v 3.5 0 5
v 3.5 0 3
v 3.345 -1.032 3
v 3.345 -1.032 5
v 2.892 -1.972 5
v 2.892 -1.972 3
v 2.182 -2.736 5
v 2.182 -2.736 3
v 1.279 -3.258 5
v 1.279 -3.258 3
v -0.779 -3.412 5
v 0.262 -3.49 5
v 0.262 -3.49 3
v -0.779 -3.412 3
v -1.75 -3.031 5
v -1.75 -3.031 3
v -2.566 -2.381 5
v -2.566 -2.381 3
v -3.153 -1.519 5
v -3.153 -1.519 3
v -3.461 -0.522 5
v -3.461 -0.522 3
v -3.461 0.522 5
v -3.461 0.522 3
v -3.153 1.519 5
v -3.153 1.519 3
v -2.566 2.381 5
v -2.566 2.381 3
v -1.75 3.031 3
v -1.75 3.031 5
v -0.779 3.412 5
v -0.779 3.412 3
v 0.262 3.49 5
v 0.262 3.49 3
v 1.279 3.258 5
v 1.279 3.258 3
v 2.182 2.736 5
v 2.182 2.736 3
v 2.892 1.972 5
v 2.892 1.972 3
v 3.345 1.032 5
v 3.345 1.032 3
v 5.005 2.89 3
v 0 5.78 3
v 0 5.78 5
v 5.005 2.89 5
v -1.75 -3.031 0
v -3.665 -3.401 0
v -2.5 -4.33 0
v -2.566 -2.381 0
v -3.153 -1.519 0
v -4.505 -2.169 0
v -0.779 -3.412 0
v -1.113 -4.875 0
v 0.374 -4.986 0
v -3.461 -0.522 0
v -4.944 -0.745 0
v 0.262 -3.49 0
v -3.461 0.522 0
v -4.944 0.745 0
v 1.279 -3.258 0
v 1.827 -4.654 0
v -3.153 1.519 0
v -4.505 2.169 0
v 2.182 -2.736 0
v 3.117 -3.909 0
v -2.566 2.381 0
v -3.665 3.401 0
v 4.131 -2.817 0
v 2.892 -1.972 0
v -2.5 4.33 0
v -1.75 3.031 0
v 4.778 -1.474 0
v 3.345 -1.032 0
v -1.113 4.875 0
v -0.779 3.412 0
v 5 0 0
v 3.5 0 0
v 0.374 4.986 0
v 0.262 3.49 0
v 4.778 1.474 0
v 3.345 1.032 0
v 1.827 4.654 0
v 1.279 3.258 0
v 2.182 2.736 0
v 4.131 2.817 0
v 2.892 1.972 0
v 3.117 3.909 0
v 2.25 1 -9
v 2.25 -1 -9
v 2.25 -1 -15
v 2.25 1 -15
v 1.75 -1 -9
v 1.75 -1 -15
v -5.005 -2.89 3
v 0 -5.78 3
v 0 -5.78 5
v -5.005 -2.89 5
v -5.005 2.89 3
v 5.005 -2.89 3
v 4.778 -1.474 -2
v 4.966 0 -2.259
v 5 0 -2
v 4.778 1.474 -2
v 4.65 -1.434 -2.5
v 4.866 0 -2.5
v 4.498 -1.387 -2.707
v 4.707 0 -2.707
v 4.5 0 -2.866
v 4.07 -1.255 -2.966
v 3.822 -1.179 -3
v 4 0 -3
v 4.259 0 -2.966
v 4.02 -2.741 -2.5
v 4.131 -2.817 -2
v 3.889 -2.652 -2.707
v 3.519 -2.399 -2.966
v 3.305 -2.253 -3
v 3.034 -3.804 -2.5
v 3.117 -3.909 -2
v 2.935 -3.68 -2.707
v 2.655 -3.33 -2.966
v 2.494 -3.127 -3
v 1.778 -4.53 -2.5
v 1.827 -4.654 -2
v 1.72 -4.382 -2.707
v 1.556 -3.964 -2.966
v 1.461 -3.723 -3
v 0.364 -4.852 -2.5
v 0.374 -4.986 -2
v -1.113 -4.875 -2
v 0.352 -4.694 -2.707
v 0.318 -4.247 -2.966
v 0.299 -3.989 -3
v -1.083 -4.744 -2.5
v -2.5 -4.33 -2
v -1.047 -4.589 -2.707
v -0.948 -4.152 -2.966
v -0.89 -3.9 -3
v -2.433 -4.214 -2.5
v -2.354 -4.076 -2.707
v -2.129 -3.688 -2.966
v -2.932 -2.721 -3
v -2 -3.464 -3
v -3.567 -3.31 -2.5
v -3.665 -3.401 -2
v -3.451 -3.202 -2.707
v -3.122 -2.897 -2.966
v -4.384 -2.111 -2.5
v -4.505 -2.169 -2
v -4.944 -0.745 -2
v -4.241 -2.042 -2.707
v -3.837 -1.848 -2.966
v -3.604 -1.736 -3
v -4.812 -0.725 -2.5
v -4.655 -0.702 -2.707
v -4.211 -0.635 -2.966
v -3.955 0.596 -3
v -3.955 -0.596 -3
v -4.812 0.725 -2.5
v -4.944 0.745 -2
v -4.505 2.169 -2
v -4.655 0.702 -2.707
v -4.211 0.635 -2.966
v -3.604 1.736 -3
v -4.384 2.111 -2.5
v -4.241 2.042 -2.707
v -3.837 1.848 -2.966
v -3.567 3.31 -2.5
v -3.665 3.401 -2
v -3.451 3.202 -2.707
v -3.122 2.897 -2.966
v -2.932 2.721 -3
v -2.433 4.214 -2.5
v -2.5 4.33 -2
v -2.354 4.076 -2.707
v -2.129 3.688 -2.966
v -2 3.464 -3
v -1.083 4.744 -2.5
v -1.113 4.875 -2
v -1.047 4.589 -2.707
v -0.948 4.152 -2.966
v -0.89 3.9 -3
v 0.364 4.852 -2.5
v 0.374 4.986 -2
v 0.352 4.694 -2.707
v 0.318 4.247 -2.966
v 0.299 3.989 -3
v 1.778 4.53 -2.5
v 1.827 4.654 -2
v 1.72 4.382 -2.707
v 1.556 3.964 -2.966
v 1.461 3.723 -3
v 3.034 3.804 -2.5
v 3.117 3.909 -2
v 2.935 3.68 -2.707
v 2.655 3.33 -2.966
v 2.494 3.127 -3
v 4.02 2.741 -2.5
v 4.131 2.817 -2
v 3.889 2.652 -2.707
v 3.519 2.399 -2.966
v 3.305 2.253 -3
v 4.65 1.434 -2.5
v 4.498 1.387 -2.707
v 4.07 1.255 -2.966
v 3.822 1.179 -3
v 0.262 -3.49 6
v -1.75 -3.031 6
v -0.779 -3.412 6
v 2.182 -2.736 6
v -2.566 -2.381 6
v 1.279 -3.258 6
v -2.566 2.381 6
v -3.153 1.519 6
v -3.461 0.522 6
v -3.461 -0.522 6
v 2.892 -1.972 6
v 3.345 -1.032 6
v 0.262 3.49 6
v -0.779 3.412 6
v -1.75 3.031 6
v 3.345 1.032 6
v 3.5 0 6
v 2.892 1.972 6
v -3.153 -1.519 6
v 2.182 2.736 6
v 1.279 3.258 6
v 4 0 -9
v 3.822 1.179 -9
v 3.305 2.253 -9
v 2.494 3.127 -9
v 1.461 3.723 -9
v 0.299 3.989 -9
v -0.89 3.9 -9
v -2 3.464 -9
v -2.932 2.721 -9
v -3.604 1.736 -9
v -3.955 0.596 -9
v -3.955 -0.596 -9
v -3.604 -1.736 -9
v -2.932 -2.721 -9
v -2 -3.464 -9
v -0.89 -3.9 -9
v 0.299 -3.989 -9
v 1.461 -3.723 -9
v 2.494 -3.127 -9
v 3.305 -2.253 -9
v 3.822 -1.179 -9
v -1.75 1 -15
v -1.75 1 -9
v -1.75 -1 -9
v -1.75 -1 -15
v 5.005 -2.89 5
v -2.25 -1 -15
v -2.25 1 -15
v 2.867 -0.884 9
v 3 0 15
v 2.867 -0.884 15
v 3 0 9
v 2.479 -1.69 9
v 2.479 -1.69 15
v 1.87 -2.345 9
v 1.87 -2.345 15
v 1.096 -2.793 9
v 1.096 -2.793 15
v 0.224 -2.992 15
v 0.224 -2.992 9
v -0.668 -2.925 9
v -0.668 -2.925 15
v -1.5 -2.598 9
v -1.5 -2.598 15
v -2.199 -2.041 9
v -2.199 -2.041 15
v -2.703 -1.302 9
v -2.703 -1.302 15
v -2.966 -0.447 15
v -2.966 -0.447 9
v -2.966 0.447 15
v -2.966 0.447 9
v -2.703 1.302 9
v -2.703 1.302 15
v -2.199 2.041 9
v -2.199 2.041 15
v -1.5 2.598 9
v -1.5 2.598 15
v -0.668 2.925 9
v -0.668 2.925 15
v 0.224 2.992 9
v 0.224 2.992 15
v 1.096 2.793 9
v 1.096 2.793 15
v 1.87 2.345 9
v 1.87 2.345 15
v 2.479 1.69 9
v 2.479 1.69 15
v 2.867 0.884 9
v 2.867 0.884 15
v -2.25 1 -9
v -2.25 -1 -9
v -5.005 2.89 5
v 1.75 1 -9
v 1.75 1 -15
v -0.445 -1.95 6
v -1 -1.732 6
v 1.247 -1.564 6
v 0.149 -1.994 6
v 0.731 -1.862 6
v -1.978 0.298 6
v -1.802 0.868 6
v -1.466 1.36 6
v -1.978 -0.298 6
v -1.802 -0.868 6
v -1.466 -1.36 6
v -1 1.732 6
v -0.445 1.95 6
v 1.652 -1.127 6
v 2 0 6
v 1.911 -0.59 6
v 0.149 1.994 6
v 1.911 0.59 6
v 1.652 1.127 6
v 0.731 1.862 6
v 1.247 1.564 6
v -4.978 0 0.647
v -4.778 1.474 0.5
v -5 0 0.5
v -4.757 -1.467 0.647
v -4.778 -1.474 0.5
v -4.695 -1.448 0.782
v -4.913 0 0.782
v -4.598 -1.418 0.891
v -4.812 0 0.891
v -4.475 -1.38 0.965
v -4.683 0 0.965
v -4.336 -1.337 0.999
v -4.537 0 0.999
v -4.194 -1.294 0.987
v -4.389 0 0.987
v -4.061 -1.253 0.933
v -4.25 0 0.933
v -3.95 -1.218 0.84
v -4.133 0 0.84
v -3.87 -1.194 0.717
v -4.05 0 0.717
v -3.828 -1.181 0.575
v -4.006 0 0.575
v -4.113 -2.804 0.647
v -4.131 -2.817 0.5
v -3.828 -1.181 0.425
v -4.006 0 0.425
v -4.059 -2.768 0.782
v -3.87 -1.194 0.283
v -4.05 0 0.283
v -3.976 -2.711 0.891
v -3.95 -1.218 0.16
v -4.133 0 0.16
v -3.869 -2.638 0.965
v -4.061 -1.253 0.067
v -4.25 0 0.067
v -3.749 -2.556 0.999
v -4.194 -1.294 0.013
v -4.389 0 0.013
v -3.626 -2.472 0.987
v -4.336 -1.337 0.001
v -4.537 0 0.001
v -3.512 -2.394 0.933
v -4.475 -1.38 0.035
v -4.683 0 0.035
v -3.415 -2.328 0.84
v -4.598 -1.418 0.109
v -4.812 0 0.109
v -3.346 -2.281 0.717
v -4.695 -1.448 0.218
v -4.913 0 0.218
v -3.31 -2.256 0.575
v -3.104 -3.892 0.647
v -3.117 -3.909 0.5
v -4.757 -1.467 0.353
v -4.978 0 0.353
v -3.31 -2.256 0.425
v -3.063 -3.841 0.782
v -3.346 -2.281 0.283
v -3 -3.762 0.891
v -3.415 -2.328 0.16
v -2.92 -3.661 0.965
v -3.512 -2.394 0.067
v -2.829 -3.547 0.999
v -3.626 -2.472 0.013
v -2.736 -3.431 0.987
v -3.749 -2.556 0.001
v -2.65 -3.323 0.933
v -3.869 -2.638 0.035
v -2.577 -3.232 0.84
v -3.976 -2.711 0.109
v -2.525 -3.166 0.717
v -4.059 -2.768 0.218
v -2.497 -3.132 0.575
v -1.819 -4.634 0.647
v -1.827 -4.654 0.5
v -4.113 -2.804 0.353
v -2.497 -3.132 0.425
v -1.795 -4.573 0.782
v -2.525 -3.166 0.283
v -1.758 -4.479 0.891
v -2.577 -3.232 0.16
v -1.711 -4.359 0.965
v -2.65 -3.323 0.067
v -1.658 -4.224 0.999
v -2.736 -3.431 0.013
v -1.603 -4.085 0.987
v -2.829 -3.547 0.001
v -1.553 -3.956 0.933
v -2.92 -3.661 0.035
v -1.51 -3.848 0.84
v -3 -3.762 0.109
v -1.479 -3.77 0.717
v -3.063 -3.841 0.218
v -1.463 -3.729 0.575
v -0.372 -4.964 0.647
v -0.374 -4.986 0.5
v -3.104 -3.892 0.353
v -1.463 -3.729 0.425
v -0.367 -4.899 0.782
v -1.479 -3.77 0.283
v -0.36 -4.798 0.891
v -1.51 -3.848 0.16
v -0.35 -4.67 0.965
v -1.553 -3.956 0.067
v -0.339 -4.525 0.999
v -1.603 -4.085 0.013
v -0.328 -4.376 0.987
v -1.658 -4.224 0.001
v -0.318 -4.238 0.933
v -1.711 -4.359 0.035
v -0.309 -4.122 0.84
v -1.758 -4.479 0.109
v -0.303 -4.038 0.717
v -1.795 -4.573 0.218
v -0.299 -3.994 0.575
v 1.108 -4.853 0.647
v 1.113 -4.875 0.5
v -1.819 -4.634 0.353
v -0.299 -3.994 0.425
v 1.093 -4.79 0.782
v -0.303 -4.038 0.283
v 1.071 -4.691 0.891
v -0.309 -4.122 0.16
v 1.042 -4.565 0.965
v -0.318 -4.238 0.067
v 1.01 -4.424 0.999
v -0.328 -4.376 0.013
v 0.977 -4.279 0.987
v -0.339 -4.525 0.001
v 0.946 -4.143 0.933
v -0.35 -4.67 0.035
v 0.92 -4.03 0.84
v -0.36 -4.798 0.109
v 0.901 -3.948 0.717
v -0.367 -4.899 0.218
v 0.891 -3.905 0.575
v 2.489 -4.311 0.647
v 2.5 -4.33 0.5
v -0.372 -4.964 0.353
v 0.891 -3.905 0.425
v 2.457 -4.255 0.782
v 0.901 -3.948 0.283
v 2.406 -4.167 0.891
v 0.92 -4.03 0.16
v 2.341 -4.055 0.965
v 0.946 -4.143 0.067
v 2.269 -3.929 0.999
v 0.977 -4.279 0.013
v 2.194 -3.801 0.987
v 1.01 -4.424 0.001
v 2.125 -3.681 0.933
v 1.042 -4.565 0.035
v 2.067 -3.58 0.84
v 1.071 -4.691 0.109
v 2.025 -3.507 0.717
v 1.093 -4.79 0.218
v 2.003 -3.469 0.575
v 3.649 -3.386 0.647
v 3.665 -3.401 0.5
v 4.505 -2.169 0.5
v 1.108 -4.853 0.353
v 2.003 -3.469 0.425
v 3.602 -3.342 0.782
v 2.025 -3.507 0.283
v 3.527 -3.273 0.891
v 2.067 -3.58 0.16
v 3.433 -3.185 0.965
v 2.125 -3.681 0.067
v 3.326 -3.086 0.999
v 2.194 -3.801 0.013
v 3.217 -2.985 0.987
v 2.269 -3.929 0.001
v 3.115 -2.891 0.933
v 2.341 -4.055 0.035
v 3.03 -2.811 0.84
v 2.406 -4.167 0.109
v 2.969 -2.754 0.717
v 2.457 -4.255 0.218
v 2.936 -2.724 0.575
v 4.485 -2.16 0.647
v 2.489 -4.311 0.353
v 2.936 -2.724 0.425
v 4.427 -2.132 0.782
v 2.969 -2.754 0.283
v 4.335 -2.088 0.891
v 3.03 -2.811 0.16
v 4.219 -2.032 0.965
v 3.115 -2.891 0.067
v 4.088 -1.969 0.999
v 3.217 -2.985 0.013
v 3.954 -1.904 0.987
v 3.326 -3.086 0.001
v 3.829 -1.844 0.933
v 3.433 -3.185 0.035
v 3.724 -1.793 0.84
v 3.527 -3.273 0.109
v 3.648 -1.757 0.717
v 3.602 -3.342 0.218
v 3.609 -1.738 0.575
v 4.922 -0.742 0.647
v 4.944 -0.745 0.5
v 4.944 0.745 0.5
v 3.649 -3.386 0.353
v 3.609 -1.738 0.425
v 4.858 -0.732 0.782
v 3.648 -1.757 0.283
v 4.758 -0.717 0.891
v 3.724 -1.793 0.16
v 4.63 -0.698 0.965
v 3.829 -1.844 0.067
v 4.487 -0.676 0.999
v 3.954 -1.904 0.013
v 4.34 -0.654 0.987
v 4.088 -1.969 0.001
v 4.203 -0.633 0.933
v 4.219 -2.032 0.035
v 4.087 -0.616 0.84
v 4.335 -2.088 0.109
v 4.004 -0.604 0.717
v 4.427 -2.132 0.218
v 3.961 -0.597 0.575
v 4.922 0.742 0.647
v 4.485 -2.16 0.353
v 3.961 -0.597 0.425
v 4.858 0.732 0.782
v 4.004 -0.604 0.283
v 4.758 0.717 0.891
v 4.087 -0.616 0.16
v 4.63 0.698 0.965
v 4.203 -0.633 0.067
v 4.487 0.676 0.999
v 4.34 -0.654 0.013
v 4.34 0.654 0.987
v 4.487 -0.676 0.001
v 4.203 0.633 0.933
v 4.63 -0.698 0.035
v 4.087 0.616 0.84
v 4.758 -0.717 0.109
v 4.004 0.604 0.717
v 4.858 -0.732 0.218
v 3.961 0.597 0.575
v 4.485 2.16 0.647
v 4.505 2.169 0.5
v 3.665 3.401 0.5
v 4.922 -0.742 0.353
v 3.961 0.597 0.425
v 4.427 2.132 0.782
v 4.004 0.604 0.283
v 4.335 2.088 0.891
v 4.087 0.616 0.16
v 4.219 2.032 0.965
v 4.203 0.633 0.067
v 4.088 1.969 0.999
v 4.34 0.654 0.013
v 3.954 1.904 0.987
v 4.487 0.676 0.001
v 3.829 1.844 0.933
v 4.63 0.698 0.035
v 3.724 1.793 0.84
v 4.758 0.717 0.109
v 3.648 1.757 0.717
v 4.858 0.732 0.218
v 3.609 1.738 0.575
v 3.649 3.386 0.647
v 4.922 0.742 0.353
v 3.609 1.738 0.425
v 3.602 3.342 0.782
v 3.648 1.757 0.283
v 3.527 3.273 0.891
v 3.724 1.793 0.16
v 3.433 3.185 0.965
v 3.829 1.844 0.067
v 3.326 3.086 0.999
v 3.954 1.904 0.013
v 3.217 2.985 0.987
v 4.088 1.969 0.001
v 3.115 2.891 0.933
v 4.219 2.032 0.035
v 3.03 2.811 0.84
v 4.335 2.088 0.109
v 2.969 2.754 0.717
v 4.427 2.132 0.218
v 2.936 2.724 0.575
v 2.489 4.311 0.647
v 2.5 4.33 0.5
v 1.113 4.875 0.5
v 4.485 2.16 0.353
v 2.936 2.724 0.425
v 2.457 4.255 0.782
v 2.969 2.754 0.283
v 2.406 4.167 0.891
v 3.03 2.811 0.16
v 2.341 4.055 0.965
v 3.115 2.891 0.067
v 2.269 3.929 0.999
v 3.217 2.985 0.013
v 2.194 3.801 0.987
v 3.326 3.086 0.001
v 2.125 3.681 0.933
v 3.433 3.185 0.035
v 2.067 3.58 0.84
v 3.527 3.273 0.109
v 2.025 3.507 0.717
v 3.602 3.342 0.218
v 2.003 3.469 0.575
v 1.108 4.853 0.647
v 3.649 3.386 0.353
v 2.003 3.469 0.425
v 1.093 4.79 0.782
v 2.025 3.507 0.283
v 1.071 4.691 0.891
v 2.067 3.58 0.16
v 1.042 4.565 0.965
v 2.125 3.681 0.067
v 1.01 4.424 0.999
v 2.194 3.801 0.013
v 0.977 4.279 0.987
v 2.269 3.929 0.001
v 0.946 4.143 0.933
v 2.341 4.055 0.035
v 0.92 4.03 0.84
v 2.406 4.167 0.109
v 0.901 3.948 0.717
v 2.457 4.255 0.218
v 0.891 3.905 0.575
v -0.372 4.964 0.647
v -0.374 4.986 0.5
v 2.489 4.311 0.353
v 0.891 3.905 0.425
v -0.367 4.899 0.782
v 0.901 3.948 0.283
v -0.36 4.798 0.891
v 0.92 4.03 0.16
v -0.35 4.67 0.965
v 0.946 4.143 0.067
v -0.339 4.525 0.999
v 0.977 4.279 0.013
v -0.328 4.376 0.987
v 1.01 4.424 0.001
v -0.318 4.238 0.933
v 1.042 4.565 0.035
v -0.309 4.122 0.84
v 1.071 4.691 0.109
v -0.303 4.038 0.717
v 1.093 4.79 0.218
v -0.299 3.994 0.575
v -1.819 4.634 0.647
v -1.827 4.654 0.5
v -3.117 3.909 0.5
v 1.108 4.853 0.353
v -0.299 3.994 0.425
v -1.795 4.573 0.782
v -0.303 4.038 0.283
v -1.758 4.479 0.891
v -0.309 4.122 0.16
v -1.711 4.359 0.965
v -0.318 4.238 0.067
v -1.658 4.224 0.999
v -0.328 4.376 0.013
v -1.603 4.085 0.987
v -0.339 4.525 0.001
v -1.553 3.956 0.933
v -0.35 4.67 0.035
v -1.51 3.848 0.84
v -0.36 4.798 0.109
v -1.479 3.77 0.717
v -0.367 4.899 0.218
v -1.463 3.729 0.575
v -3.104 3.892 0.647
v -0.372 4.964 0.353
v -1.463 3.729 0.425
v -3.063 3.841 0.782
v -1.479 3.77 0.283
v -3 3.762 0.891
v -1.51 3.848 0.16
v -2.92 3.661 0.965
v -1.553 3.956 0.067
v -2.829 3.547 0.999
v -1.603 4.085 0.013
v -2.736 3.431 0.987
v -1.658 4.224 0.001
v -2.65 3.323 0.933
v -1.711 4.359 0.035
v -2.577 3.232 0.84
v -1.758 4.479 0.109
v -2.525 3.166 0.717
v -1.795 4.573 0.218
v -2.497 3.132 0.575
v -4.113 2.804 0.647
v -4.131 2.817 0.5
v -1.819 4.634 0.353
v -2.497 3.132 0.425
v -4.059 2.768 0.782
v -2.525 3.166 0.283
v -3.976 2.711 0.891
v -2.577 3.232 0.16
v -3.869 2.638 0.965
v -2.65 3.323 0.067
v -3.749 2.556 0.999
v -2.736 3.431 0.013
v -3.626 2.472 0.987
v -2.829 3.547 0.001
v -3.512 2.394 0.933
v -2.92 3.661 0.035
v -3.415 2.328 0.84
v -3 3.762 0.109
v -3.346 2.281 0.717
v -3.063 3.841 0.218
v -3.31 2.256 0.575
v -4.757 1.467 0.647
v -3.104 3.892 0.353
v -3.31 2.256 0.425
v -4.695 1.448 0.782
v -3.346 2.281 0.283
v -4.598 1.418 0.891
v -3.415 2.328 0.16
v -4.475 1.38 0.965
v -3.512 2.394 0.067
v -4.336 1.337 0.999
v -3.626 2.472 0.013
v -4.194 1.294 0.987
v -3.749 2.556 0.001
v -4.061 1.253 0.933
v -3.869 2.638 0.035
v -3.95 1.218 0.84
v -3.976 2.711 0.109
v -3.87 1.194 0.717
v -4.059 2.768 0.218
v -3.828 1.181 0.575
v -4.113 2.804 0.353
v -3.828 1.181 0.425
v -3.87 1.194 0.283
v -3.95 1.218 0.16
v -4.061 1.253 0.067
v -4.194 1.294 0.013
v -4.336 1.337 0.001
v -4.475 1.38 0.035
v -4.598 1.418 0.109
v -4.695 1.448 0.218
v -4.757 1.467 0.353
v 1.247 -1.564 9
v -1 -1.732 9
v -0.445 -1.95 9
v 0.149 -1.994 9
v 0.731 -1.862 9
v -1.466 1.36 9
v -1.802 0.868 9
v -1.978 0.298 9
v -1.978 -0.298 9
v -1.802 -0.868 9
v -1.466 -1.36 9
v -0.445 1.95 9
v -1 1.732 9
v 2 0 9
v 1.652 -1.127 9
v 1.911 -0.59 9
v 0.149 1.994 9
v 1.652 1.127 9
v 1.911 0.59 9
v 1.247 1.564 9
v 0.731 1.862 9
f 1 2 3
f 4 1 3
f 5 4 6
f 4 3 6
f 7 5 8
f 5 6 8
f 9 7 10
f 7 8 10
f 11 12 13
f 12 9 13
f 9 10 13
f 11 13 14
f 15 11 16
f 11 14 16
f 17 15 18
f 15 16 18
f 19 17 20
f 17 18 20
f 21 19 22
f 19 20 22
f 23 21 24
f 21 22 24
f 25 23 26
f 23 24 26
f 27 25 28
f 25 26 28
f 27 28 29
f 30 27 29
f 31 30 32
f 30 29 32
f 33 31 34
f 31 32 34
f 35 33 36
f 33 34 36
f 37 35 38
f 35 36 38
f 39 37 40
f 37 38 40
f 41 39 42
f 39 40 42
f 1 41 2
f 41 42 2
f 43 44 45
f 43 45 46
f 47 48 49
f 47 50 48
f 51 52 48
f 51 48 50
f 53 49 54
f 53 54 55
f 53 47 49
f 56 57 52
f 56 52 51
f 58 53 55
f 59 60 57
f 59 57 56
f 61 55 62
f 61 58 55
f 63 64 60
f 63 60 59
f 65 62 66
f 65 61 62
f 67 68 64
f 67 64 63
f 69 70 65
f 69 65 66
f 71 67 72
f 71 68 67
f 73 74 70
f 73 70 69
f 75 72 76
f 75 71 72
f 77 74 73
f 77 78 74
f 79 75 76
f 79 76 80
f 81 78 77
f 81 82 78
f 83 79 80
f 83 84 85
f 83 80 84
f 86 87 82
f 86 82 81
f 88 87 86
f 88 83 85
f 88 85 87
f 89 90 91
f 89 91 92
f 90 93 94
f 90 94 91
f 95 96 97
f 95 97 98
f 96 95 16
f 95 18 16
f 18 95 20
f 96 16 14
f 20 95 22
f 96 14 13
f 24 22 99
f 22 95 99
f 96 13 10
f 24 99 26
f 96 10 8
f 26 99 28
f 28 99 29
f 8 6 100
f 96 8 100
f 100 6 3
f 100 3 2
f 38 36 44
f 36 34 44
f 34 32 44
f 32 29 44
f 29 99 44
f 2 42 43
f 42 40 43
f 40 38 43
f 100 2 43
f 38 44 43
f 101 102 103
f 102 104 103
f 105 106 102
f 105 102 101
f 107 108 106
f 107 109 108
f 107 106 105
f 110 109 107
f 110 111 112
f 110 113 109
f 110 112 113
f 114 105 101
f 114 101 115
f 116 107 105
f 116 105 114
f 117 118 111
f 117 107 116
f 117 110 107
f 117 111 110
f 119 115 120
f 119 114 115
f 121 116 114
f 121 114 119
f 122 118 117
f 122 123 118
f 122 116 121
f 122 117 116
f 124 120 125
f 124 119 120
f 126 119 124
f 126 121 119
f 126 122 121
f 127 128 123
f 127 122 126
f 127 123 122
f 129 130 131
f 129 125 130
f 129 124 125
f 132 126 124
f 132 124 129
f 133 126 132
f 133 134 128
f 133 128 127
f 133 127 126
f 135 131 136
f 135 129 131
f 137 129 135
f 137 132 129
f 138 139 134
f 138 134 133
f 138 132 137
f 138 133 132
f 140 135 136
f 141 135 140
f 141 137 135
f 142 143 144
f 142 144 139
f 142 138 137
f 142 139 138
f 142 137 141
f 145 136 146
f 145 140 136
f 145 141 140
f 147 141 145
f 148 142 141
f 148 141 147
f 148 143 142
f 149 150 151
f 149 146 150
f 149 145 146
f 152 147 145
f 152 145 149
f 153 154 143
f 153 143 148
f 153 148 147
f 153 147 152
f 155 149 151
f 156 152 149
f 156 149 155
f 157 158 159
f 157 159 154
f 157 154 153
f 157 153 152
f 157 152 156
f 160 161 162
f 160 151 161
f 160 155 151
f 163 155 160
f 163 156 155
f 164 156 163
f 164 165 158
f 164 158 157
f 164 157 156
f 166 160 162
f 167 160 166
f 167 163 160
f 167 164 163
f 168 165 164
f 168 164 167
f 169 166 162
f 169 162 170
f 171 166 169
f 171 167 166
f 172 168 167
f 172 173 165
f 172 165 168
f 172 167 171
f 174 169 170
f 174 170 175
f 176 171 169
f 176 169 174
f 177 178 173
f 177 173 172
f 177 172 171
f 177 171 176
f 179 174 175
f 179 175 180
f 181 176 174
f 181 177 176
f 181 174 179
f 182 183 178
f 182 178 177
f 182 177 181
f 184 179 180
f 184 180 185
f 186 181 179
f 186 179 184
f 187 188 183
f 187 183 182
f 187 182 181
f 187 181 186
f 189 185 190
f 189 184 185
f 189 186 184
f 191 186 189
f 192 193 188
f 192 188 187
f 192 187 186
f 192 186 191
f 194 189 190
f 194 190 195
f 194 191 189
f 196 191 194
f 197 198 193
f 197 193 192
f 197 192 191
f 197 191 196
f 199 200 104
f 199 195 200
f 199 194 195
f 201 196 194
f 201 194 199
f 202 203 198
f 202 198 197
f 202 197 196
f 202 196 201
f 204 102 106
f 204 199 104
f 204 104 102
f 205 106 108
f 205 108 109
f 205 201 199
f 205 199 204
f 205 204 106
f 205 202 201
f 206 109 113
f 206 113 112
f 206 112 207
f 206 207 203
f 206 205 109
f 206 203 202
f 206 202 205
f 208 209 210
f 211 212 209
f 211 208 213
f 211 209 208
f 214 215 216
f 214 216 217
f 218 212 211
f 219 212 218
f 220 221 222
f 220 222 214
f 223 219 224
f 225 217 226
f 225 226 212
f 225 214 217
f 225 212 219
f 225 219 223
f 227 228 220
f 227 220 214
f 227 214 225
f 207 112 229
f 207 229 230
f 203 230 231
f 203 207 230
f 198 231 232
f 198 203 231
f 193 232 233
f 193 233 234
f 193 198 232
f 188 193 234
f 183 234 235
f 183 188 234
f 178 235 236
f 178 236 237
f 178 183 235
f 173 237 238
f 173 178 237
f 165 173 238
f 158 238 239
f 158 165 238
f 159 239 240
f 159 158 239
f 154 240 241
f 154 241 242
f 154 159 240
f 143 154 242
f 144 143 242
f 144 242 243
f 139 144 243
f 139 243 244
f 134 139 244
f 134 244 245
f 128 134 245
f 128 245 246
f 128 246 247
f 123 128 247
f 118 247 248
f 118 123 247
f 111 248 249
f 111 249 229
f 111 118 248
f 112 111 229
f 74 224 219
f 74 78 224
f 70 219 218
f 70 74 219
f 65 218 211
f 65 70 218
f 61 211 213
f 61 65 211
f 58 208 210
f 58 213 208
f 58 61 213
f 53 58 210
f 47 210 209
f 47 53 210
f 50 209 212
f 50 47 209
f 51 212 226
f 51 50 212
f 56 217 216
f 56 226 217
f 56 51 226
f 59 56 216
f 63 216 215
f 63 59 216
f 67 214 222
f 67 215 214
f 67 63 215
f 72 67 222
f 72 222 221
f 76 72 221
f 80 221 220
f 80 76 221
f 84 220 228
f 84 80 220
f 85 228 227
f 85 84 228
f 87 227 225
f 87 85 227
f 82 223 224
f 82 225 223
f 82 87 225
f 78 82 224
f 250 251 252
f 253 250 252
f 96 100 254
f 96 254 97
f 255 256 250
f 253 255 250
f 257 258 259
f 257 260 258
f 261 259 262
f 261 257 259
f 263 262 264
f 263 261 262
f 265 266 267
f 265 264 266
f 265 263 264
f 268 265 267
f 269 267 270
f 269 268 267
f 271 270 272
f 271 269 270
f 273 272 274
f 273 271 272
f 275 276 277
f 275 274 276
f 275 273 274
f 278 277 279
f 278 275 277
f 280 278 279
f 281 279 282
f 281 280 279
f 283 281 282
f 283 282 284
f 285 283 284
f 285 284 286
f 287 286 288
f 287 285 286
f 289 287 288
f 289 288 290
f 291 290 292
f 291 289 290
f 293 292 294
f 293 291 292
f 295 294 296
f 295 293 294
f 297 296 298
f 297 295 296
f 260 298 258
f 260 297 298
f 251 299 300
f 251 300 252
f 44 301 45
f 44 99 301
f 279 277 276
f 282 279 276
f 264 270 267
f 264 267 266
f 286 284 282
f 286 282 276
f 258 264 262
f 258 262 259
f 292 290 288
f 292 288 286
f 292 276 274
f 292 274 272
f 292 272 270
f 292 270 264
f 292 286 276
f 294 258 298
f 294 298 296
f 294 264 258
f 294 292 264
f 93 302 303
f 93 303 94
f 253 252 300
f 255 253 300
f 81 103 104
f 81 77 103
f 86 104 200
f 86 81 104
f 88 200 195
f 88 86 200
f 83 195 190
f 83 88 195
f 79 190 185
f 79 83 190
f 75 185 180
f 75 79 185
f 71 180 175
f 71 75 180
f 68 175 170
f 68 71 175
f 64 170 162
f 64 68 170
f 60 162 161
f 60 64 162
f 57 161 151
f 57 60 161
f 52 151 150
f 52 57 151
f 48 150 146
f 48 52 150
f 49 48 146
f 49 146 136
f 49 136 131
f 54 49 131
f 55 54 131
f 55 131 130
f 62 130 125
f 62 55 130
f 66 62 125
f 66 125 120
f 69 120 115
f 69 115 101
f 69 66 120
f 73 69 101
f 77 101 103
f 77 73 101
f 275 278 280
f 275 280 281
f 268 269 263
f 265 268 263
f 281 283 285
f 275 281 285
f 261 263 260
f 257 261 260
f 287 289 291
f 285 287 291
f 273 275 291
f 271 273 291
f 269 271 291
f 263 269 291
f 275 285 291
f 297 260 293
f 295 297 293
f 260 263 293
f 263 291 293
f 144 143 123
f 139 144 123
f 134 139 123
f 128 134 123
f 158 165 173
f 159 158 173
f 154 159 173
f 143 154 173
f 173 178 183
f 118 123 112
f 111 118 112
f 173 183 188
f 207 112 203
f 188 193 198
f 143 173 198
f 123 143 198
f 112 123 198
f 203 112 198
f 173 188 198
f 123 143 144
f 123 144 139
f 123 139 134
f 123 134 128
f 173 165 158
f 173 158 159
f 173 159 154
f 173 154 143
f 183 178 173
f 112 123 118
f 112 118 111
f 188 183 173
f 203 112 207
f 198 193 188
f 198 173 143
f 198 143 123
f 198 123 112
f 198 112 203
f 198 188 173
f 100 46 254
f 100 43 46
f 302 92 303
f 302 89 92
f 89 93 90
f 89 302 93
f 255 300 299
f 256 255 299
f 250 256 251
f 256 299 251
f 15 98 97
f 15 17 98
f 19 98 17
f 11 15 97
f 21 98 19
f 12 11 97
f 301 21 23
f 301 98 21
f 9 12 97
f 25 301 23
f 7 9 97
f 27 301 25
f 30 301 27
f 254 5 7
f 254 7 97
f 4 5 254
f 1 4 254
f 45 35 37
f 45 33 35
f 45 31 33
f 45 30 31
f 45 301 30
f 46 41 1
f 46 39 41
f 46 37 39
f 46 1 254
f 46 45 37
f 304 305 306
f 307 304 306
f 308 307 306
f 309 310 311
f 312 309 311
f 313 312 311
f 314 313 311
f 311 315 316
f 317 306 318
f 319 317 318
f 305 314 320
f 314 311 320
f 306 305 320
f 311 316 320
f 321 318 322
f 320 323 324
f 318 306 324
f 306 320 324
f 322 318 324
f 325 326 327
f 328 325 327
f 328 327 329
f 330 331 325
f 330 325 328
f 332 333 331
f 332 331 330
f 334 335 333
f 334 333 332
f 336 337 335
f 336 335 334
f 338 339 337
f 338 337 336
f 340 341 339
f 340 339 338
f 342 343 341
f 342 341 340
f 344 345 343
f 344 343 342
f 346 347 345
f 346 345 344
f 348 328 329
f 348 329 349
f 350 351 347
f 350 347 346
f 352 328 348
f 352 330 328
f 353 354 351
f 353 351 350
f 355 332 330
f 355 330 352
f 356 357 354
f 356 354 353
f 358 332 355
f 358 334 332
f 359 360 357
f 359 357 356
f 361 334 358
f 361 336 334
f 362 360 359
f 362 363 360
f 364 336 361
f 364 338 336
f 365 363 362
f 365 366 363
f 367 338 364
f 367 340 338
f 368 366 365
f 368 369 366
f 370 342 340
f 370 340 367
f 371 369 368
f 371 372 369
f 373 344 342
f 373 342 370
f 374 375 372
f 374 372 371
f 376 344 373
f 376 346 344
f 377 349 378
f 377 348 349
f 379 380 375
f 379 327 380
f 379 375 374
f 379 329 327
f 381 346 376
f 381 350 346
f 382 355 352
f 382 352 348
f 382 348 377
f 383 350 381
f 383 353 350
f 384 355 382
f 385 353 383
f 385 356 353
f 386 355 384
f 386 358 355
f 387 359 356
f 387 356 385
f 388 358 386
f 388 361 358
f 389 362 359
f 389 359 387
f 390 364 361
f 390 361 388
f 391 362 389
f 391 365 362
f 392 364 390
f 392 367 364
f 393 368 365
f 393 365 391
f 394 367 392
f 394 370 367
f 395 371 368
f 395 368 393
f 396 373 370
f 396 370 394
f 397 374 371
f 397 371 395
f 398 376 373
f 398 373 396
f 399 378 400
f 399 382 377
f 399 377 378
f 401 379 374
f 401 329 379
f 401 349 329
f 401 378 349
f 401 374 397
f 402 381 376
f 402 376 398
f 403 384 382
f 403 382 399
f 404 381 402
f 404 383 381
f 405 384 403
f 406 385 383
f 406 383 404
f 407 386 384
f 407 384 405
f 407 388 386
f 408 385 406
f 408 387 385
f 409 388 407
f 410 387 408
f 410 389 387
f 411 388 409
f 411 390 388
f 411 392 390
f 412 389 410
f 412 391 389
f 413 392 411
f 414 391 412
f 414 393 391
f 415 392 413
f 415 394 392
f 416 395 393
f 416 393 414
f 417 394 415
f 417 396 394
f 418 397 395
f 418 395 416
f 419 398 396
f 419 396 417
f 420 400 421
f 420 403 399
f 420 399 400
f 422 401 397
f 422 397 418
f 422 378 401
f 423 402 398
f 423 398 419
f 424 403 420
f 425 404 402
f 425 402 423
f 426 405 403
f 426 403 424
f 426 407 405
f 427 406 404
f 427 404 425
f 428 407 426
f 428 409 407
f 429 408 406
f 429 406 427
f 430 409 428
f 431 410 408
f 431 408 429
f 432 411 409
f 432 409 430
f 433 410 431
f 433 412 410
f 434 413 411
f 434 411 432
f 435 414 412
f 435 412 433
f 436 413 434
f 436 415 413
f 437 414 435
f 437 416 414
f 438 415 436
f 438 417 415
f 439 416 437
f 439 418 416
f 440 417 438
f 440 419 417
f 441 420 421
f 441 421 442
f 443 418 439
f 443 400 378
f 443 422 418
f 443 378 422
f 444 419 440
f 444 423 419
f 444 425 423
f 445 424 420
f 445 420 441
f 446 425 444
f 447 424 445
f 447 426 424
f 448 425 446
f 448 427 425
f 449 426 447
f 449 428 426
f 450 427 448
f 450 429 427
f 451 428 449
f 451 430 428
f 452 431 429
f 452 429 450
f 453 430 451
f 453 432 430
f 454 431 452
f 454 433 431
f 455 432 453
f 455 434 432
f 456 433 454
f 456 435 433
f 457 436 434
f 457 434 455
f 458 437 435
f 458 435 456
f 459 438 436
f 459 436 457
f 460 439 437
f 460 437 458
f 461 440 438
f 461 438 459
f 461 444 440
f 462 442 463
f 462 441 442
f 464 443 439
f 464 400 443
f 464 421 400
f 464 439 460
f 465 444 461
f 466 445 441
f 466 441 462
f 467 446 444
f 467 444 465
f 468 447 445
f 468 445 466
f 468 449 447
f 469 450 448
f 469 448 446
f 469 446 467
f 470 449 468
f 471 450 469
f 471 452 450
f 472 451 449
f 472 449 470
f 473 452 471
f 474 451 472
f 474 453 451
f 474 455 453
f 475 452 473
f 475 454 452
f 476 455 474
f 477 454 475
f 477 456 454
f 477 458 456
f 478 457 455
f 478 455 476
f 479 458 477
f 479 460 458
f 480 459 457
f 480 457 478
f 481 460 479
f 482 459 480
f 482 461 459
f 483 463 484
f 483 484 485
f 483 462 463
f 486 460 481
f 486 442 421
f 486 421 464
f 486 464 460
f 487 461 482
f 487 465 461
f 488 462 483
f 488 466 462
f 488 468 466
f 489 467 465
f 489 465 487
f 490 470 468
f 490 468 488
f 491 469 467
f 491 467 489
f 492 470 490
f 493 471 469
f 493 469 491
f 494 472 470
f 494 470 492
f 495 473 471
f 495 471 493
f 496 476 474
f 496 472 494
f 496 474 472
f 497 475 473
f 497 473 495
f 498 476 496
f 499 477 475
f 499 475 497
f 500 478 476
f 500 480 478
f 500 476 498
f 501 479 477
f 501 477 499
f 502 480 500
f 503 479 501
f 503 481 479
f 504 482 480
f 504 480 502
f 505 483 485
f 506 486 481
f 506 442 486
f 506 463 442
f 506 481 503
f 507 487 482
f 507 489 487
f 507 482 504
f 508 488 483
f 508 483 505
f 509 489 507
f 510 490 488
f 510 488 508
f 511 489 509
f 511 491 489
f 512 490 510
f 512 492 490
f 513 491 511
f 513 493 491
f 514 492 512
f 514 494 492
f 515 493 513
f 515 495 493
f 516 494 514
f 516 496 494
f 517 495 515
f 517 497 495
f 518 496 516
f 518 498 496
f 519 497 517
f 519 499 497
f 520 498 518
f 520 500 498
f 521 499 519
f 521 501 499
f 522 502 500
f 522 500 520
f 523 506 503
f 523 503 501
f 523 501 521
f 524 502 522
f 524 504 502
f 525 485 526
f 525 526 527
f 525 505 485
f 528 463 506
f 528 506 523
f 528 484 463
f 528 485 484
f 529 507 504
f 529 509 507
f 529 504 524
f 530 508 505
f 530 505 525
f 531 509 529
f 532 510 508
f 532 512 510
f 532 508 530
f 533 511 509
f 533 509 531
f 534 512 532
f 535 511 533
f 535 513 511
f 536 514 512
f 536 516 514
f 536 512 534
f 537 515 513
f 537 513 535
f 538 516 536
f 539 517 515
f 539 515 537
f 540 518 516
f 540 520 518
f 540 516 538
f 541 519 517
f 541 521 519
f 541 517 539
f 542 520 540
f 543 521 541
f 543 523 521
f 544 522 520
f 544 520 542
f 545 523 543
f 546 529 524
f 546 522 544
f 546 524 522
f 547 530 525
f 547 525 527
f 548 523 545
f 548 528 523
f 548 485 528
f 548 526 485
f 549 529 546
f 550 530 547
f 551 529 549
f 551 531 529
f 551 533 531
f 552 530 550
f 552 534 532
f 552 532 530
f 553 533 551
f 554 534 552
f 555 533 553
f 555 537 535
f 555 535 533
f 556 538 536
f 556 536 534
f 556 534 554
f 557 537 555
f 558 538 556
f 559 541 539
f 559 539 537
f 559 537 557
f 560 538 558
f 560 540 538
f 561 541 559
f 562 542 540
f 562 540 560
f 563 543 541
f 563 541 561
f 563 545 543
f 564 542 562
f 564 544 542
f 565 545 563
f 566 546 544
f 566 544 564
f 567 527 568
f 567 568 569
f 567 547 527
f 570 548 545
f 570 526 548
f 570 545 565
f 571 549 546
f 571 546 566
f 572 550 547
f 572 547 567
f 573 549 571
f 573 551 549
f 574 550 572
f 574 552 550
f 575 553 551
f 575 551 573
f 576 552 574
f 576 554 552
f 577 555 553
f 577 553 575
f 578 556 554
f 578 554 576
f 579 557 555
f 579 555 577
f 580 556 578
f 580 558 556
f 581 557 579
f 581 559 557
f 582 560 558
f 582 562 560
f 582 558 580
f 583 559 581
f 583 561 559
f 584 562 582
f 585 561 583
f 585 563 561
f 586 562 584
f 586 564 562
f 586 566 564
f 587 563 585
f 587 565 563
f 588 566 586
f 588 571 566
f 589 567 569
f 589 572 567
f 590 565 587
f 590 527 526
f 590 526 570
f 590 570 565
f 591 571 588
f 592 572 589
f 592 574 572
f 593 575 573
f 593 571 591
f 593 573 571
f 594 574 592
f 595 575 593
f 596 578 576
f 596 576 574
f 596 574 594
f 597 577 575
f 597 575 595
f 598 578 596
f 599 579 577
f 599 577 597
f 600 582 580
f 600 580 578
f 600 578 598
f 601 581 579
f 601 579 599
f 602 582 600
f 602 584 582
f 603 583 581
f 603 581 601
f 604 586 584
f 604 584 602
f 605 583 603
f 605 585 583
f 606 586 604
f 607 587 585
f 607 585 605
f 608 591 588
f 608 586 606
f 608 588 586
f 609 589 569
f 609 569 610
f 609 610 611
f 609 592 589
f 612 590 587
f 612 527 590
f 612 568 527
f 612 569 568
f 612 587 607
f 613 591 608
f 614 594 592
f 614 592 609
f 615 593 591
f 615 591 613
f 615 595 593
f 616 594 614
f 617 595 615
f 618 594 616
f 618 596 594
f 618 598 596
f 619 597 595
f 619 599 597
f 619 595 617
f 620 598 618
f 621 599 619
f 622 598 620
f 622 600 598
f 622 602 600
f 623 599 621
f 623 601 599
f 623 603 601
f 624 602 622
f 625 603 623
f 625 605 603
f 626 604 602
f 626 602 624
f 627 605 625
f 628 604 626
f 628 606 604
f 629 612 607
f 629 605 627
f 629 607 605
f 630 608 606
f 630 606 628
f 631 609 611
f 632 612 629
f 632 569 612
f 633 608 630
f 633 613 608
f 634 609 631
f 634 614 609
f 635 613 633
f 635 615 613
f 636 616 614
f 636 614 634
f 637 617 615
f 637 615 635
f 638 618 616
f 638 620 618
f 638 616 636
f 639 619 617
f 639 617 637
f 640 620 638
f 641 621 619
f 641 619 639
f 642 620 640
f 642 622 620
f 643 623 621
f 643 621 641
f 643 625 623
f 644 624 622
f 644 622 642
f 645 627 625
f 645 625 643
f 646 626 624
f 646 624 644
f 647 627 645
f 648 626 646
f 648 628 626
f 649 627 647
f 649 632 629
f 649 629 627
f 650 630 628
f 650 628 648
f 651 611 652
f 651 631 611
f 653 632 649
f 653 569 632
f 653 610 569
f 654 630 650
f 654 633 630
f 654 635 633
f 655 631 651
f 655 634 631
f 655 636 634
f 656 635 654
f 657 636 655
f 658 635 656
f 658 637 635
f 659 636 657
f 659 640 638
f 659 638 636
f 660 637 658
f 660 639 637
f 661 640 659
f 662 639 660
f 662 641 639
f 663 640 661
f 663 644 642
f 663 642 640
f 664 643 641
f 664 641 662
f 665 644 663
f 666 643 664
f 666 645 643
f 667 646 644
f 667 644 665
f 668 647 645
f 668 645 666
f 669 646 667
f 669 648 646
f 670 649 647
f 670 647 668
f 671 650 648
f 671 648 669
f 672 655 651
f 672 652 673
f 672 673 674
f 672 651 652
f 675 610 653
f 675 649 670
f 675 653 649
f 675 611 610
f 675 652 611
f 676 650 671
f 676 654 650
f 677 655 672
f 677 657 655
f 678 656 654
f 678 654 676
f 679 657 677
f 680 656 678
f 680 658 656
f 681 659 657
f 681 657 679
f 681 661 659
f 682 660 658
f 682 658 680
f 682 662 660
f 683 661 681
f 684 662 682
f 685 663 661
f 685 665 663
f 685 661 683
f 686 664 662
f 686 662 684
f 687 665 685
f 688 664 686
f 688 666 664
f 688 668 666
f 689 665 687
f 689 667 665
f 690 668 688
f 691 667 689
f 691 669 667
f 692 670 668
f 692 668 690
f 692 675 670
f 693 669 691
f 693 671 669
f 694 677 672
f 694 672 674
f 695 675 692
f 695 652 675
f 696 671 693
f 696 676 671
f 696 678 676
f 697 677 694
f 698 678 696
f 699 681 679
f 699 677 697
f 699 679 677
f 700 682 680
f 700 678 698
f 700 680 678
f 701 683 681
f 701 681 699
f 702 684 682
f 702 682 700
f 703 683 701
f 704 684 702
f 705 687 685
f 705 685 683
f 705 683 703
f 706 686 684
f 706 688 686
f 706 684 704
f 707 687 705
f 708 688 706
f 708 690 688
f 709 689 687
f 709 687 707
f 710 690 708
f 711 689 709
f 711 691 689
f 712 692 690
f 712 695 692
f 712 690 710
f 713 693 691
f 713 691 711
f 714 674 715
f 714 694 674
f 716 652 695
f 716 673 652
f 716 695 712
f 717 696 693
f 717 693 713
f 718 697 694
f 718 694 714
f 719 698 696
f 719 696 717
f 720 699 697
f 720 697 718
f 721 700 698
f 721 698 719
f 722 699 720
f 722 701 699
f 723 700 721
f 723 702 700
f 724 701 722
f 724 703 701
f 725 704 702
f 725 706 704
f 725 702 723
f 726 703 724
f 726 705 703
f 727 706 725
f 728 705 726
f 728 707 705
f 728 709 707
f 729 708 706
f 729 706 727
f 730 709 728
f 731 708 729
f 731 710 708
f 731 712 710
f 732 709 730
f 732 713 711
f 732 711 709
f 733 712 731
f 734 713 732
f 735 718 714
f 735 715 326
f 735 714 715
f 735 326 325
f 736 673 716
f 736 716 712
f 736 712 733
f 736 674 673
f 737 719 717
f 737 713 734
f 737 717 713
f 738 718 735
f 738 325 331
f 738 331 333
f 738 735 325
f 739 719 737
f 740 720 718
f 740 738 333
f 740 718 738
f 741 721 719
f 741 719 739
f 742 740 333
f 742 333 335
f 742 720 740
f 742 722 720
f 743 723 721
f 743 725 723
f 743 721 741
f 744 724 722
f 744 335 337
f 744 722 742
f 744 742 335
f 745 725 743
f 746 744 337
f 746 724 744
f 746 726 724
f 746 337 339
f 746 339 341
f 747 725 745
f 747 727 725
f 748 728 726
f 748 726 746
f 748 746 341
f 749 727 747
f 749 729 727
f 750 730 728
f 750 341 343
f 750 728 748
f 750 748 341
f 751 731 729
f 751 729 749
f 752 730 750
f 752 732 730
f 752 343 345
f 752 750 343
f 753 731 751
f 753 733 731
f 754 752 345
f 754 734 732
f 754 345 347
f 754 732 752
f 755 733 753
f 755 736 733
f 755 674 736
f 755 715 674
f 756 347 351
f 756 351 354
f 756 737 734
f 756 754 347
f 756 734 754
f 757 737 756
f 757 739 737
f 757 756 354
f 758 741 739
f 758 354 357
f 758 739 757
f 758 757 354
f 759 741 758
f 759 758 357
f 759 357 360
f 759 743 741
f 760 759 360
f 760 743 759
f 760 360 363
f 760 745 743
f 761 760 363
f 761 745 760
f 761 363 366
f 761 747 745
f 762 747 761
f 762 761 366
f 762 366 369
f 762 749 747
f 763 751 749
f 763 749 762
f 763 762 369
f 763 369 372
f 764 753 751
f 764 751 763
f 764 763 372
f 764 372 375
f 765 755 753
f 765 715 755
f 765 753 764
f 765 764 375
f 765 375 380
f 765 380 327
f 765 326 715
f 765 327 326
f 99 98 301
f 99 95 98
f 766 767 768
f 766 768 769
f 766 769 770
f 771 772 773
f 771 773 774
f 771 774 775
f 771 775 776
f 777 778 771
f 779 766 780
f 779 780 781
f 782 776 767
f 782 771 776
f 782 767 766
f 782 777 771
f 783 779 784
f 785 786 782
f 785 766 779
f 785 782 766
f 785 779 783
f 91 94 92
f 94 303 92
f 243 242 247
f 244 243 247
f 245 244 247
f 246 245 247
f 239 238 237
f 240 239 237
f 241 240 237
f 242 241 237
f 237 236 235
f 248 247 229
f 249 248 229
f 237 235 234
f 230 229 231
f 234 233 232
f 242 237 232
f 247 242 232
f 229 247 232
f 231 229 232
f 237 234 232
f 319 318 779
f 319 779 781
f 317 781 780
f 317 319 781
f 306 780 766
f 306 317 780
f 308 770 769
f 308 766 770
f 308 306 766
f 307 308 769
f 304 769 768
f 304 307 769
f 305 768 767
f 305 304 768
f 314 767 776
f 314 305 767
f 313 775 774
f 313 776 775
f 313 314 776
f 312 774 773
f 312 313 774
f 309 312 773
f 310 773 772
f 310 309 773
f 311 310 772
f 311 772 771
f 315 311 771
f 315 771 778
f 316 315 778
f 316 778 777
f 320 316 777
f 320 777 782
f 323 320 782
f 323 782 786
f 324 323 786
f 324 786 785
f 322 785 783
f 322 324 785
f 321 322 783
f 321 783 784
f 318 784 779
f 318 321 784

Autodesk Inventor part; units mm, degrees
ref_plane "YZ Plane" through (0, 0, 0) normal (1, 0, 0) x (0, 1, 0)
ref_plane "XZ Plane" through (0, 0, 0) normal (0, 1, 0) x (-1, 0, 0)
ref_plane "XY Plane" through (0, 0, 0) normal (0, 0, 1) x (1, 0, 0)
sketch "Skizze1" plane through (0, 0, 0) normal (0, 0, 1) x (1, 0, 0)
  circle A0 centre (0, 0) radius 5
  dimension "d0" = 10
extrude "Extrusion1" add sketch "Skizze1" against normal blind 3
fillet "Rundung1" radius 1 1 edges at (-5, 0, -3)
sketch "Skizze2" plane through (0, 0, 0) normal (0, 0, 1) x (1, 0, 0)
  circle A0 centre (0, 0) radius 3.5
  dimension "d4" = 7
extrude "Extrusion2" add sketch "Skizze2" along normal blind 6
thread "Gewinde1" size "M7x1" class "6g" standard "ANSI Metric M Profile" full length
sketch "Skizze3" plane through (0, 0, 0) normal (0, 0, 1) x (1, 0, 0)
  circle A0 centre (0, 0) radius 2
  dimension "d9" = 4
extrude "Extrusion3" add sketch "Skizze3" along normal blind 3 separate body
move or copy body "Körper verschieben1" bodies to move or copy 2 copy no translate (0, 0, 6)
sketch "Skizze4" plane through (0, 0, 0) normal (0, 0, 1) x (1, 0, 0)
  circle A0 centre (0, 0) radius 3
  dimension "d15" = 6
extrude "Extrusion4" add sketch "Skizze4" along normal blind 6 separate body
move or copy body "Körper verschieben2" bodies to move or copy 3 copy no translate (0, 0, 9)
sketch "Skizze5" plane through (0, 0, 0) normal (0, 0, 1) x (1, 0, 0)
  circle A0 centre (0, 0) radius 4
  dimension "d21" = 8
extrude "Extrusion5" add sketch "Skizze5" against normal blind 6 separate body
move or copy body "Körper verschieben3" bodies to move or copy 4 copy no translate (0, 0, -3)
sketch "Skizze6" plane through (0, 0, 0) normal (0, 0, 1) x (1, 0, 0)
  line L0 (-1.75, -1) -> (-2.25, -1)
  line L1 (-2.25, -1) -> (-2.25, 1)
  line L2 (-2.25, 1) -> (-1.75, 1)
  line L3 (-1.75, 1) -> (-1.75, -1)
  line L4 (-1.75, -1) -> (-2.25, 1) construction
  line L5 (-2.25, -1) -> (-1.75, 1) construction
  line L6 (1.75, -1) -> (2.25, -1)
  line L7 (2.25, -1) -> (2.25, 1)
  line L8 (2.25, 1) -> (1.75, 1)
  line L9 (1.75, 1) -> (1.75, -1)
  line L10 (1.75, -1) -> (2.25, 1) construction
  line L11 (2.25, -1) -> (1.75, 1) construction
  point P0 (0, 0)
  point P1 (-2, 0)
  point P2 (2, 0)
  dimension "d27" = 0.5
  dimension "d28" = 2
  dimension "d29" = 0.5
  dimension "d30" = 2
extrude "Extrusion6" add sketch "Skizze6" against normal blind 6 separate body
move or copy body "Körper verschieben4" bodies to move or copy 5 copy no translate (0, 0, -9)
sketch "Skizze8" plane through (0, 0, 0) normal (0, 1, 0) x (-1, 0, 0)
  circle A0 centre (4.5, 0) radius 0.5
  line L0 (0, -1.125) -> (0, 1.125)
  line L1 (0, 0) -> (4.5, 0) construction
  dimension "d36" = 1
  dimension "d37" = 4.5
revolve "Umdrehung1" add sketch "Skizze8" angle 360 about axis through (0, 0, -1.125) along (0, 0, 1) separate body
move or copy body "Körper verschieben5" bodies to move or copy 6 copy no translate (0, 0, 0.5)
sketch "Skizze9" plane through (0, 0, 0) normal (0, 0, 1) x (1, 0, 0)
  line L0 (0, 5.7796) -> (5.0053, 2.8898)
  line L1 (5.0053, 2.8898) -> (5.0053, -2.8898)
  line L2 (5.0053, -2.8898) -> (0, -5.7796)
  line L3 (0, -5.7796) -> (-5.0053, -2.8898)
  line L4 (-5.0053, -2.8898) -> (-5.0053, 2.8898)
  line L5 (-5.0053, 2.8898) -> (0, 5.7796)
  circle A0 centre (0, 0) radius 3.5
  dimension "d44" = 7
extrude "Extrusion7" add sketch "Skizze9" along normal blind 2 separate body
move or copy body "Körper verschieben6" bodies to move or copy 7 copy no translate (0, 0, 3)
properties part number "Pushbutton"
